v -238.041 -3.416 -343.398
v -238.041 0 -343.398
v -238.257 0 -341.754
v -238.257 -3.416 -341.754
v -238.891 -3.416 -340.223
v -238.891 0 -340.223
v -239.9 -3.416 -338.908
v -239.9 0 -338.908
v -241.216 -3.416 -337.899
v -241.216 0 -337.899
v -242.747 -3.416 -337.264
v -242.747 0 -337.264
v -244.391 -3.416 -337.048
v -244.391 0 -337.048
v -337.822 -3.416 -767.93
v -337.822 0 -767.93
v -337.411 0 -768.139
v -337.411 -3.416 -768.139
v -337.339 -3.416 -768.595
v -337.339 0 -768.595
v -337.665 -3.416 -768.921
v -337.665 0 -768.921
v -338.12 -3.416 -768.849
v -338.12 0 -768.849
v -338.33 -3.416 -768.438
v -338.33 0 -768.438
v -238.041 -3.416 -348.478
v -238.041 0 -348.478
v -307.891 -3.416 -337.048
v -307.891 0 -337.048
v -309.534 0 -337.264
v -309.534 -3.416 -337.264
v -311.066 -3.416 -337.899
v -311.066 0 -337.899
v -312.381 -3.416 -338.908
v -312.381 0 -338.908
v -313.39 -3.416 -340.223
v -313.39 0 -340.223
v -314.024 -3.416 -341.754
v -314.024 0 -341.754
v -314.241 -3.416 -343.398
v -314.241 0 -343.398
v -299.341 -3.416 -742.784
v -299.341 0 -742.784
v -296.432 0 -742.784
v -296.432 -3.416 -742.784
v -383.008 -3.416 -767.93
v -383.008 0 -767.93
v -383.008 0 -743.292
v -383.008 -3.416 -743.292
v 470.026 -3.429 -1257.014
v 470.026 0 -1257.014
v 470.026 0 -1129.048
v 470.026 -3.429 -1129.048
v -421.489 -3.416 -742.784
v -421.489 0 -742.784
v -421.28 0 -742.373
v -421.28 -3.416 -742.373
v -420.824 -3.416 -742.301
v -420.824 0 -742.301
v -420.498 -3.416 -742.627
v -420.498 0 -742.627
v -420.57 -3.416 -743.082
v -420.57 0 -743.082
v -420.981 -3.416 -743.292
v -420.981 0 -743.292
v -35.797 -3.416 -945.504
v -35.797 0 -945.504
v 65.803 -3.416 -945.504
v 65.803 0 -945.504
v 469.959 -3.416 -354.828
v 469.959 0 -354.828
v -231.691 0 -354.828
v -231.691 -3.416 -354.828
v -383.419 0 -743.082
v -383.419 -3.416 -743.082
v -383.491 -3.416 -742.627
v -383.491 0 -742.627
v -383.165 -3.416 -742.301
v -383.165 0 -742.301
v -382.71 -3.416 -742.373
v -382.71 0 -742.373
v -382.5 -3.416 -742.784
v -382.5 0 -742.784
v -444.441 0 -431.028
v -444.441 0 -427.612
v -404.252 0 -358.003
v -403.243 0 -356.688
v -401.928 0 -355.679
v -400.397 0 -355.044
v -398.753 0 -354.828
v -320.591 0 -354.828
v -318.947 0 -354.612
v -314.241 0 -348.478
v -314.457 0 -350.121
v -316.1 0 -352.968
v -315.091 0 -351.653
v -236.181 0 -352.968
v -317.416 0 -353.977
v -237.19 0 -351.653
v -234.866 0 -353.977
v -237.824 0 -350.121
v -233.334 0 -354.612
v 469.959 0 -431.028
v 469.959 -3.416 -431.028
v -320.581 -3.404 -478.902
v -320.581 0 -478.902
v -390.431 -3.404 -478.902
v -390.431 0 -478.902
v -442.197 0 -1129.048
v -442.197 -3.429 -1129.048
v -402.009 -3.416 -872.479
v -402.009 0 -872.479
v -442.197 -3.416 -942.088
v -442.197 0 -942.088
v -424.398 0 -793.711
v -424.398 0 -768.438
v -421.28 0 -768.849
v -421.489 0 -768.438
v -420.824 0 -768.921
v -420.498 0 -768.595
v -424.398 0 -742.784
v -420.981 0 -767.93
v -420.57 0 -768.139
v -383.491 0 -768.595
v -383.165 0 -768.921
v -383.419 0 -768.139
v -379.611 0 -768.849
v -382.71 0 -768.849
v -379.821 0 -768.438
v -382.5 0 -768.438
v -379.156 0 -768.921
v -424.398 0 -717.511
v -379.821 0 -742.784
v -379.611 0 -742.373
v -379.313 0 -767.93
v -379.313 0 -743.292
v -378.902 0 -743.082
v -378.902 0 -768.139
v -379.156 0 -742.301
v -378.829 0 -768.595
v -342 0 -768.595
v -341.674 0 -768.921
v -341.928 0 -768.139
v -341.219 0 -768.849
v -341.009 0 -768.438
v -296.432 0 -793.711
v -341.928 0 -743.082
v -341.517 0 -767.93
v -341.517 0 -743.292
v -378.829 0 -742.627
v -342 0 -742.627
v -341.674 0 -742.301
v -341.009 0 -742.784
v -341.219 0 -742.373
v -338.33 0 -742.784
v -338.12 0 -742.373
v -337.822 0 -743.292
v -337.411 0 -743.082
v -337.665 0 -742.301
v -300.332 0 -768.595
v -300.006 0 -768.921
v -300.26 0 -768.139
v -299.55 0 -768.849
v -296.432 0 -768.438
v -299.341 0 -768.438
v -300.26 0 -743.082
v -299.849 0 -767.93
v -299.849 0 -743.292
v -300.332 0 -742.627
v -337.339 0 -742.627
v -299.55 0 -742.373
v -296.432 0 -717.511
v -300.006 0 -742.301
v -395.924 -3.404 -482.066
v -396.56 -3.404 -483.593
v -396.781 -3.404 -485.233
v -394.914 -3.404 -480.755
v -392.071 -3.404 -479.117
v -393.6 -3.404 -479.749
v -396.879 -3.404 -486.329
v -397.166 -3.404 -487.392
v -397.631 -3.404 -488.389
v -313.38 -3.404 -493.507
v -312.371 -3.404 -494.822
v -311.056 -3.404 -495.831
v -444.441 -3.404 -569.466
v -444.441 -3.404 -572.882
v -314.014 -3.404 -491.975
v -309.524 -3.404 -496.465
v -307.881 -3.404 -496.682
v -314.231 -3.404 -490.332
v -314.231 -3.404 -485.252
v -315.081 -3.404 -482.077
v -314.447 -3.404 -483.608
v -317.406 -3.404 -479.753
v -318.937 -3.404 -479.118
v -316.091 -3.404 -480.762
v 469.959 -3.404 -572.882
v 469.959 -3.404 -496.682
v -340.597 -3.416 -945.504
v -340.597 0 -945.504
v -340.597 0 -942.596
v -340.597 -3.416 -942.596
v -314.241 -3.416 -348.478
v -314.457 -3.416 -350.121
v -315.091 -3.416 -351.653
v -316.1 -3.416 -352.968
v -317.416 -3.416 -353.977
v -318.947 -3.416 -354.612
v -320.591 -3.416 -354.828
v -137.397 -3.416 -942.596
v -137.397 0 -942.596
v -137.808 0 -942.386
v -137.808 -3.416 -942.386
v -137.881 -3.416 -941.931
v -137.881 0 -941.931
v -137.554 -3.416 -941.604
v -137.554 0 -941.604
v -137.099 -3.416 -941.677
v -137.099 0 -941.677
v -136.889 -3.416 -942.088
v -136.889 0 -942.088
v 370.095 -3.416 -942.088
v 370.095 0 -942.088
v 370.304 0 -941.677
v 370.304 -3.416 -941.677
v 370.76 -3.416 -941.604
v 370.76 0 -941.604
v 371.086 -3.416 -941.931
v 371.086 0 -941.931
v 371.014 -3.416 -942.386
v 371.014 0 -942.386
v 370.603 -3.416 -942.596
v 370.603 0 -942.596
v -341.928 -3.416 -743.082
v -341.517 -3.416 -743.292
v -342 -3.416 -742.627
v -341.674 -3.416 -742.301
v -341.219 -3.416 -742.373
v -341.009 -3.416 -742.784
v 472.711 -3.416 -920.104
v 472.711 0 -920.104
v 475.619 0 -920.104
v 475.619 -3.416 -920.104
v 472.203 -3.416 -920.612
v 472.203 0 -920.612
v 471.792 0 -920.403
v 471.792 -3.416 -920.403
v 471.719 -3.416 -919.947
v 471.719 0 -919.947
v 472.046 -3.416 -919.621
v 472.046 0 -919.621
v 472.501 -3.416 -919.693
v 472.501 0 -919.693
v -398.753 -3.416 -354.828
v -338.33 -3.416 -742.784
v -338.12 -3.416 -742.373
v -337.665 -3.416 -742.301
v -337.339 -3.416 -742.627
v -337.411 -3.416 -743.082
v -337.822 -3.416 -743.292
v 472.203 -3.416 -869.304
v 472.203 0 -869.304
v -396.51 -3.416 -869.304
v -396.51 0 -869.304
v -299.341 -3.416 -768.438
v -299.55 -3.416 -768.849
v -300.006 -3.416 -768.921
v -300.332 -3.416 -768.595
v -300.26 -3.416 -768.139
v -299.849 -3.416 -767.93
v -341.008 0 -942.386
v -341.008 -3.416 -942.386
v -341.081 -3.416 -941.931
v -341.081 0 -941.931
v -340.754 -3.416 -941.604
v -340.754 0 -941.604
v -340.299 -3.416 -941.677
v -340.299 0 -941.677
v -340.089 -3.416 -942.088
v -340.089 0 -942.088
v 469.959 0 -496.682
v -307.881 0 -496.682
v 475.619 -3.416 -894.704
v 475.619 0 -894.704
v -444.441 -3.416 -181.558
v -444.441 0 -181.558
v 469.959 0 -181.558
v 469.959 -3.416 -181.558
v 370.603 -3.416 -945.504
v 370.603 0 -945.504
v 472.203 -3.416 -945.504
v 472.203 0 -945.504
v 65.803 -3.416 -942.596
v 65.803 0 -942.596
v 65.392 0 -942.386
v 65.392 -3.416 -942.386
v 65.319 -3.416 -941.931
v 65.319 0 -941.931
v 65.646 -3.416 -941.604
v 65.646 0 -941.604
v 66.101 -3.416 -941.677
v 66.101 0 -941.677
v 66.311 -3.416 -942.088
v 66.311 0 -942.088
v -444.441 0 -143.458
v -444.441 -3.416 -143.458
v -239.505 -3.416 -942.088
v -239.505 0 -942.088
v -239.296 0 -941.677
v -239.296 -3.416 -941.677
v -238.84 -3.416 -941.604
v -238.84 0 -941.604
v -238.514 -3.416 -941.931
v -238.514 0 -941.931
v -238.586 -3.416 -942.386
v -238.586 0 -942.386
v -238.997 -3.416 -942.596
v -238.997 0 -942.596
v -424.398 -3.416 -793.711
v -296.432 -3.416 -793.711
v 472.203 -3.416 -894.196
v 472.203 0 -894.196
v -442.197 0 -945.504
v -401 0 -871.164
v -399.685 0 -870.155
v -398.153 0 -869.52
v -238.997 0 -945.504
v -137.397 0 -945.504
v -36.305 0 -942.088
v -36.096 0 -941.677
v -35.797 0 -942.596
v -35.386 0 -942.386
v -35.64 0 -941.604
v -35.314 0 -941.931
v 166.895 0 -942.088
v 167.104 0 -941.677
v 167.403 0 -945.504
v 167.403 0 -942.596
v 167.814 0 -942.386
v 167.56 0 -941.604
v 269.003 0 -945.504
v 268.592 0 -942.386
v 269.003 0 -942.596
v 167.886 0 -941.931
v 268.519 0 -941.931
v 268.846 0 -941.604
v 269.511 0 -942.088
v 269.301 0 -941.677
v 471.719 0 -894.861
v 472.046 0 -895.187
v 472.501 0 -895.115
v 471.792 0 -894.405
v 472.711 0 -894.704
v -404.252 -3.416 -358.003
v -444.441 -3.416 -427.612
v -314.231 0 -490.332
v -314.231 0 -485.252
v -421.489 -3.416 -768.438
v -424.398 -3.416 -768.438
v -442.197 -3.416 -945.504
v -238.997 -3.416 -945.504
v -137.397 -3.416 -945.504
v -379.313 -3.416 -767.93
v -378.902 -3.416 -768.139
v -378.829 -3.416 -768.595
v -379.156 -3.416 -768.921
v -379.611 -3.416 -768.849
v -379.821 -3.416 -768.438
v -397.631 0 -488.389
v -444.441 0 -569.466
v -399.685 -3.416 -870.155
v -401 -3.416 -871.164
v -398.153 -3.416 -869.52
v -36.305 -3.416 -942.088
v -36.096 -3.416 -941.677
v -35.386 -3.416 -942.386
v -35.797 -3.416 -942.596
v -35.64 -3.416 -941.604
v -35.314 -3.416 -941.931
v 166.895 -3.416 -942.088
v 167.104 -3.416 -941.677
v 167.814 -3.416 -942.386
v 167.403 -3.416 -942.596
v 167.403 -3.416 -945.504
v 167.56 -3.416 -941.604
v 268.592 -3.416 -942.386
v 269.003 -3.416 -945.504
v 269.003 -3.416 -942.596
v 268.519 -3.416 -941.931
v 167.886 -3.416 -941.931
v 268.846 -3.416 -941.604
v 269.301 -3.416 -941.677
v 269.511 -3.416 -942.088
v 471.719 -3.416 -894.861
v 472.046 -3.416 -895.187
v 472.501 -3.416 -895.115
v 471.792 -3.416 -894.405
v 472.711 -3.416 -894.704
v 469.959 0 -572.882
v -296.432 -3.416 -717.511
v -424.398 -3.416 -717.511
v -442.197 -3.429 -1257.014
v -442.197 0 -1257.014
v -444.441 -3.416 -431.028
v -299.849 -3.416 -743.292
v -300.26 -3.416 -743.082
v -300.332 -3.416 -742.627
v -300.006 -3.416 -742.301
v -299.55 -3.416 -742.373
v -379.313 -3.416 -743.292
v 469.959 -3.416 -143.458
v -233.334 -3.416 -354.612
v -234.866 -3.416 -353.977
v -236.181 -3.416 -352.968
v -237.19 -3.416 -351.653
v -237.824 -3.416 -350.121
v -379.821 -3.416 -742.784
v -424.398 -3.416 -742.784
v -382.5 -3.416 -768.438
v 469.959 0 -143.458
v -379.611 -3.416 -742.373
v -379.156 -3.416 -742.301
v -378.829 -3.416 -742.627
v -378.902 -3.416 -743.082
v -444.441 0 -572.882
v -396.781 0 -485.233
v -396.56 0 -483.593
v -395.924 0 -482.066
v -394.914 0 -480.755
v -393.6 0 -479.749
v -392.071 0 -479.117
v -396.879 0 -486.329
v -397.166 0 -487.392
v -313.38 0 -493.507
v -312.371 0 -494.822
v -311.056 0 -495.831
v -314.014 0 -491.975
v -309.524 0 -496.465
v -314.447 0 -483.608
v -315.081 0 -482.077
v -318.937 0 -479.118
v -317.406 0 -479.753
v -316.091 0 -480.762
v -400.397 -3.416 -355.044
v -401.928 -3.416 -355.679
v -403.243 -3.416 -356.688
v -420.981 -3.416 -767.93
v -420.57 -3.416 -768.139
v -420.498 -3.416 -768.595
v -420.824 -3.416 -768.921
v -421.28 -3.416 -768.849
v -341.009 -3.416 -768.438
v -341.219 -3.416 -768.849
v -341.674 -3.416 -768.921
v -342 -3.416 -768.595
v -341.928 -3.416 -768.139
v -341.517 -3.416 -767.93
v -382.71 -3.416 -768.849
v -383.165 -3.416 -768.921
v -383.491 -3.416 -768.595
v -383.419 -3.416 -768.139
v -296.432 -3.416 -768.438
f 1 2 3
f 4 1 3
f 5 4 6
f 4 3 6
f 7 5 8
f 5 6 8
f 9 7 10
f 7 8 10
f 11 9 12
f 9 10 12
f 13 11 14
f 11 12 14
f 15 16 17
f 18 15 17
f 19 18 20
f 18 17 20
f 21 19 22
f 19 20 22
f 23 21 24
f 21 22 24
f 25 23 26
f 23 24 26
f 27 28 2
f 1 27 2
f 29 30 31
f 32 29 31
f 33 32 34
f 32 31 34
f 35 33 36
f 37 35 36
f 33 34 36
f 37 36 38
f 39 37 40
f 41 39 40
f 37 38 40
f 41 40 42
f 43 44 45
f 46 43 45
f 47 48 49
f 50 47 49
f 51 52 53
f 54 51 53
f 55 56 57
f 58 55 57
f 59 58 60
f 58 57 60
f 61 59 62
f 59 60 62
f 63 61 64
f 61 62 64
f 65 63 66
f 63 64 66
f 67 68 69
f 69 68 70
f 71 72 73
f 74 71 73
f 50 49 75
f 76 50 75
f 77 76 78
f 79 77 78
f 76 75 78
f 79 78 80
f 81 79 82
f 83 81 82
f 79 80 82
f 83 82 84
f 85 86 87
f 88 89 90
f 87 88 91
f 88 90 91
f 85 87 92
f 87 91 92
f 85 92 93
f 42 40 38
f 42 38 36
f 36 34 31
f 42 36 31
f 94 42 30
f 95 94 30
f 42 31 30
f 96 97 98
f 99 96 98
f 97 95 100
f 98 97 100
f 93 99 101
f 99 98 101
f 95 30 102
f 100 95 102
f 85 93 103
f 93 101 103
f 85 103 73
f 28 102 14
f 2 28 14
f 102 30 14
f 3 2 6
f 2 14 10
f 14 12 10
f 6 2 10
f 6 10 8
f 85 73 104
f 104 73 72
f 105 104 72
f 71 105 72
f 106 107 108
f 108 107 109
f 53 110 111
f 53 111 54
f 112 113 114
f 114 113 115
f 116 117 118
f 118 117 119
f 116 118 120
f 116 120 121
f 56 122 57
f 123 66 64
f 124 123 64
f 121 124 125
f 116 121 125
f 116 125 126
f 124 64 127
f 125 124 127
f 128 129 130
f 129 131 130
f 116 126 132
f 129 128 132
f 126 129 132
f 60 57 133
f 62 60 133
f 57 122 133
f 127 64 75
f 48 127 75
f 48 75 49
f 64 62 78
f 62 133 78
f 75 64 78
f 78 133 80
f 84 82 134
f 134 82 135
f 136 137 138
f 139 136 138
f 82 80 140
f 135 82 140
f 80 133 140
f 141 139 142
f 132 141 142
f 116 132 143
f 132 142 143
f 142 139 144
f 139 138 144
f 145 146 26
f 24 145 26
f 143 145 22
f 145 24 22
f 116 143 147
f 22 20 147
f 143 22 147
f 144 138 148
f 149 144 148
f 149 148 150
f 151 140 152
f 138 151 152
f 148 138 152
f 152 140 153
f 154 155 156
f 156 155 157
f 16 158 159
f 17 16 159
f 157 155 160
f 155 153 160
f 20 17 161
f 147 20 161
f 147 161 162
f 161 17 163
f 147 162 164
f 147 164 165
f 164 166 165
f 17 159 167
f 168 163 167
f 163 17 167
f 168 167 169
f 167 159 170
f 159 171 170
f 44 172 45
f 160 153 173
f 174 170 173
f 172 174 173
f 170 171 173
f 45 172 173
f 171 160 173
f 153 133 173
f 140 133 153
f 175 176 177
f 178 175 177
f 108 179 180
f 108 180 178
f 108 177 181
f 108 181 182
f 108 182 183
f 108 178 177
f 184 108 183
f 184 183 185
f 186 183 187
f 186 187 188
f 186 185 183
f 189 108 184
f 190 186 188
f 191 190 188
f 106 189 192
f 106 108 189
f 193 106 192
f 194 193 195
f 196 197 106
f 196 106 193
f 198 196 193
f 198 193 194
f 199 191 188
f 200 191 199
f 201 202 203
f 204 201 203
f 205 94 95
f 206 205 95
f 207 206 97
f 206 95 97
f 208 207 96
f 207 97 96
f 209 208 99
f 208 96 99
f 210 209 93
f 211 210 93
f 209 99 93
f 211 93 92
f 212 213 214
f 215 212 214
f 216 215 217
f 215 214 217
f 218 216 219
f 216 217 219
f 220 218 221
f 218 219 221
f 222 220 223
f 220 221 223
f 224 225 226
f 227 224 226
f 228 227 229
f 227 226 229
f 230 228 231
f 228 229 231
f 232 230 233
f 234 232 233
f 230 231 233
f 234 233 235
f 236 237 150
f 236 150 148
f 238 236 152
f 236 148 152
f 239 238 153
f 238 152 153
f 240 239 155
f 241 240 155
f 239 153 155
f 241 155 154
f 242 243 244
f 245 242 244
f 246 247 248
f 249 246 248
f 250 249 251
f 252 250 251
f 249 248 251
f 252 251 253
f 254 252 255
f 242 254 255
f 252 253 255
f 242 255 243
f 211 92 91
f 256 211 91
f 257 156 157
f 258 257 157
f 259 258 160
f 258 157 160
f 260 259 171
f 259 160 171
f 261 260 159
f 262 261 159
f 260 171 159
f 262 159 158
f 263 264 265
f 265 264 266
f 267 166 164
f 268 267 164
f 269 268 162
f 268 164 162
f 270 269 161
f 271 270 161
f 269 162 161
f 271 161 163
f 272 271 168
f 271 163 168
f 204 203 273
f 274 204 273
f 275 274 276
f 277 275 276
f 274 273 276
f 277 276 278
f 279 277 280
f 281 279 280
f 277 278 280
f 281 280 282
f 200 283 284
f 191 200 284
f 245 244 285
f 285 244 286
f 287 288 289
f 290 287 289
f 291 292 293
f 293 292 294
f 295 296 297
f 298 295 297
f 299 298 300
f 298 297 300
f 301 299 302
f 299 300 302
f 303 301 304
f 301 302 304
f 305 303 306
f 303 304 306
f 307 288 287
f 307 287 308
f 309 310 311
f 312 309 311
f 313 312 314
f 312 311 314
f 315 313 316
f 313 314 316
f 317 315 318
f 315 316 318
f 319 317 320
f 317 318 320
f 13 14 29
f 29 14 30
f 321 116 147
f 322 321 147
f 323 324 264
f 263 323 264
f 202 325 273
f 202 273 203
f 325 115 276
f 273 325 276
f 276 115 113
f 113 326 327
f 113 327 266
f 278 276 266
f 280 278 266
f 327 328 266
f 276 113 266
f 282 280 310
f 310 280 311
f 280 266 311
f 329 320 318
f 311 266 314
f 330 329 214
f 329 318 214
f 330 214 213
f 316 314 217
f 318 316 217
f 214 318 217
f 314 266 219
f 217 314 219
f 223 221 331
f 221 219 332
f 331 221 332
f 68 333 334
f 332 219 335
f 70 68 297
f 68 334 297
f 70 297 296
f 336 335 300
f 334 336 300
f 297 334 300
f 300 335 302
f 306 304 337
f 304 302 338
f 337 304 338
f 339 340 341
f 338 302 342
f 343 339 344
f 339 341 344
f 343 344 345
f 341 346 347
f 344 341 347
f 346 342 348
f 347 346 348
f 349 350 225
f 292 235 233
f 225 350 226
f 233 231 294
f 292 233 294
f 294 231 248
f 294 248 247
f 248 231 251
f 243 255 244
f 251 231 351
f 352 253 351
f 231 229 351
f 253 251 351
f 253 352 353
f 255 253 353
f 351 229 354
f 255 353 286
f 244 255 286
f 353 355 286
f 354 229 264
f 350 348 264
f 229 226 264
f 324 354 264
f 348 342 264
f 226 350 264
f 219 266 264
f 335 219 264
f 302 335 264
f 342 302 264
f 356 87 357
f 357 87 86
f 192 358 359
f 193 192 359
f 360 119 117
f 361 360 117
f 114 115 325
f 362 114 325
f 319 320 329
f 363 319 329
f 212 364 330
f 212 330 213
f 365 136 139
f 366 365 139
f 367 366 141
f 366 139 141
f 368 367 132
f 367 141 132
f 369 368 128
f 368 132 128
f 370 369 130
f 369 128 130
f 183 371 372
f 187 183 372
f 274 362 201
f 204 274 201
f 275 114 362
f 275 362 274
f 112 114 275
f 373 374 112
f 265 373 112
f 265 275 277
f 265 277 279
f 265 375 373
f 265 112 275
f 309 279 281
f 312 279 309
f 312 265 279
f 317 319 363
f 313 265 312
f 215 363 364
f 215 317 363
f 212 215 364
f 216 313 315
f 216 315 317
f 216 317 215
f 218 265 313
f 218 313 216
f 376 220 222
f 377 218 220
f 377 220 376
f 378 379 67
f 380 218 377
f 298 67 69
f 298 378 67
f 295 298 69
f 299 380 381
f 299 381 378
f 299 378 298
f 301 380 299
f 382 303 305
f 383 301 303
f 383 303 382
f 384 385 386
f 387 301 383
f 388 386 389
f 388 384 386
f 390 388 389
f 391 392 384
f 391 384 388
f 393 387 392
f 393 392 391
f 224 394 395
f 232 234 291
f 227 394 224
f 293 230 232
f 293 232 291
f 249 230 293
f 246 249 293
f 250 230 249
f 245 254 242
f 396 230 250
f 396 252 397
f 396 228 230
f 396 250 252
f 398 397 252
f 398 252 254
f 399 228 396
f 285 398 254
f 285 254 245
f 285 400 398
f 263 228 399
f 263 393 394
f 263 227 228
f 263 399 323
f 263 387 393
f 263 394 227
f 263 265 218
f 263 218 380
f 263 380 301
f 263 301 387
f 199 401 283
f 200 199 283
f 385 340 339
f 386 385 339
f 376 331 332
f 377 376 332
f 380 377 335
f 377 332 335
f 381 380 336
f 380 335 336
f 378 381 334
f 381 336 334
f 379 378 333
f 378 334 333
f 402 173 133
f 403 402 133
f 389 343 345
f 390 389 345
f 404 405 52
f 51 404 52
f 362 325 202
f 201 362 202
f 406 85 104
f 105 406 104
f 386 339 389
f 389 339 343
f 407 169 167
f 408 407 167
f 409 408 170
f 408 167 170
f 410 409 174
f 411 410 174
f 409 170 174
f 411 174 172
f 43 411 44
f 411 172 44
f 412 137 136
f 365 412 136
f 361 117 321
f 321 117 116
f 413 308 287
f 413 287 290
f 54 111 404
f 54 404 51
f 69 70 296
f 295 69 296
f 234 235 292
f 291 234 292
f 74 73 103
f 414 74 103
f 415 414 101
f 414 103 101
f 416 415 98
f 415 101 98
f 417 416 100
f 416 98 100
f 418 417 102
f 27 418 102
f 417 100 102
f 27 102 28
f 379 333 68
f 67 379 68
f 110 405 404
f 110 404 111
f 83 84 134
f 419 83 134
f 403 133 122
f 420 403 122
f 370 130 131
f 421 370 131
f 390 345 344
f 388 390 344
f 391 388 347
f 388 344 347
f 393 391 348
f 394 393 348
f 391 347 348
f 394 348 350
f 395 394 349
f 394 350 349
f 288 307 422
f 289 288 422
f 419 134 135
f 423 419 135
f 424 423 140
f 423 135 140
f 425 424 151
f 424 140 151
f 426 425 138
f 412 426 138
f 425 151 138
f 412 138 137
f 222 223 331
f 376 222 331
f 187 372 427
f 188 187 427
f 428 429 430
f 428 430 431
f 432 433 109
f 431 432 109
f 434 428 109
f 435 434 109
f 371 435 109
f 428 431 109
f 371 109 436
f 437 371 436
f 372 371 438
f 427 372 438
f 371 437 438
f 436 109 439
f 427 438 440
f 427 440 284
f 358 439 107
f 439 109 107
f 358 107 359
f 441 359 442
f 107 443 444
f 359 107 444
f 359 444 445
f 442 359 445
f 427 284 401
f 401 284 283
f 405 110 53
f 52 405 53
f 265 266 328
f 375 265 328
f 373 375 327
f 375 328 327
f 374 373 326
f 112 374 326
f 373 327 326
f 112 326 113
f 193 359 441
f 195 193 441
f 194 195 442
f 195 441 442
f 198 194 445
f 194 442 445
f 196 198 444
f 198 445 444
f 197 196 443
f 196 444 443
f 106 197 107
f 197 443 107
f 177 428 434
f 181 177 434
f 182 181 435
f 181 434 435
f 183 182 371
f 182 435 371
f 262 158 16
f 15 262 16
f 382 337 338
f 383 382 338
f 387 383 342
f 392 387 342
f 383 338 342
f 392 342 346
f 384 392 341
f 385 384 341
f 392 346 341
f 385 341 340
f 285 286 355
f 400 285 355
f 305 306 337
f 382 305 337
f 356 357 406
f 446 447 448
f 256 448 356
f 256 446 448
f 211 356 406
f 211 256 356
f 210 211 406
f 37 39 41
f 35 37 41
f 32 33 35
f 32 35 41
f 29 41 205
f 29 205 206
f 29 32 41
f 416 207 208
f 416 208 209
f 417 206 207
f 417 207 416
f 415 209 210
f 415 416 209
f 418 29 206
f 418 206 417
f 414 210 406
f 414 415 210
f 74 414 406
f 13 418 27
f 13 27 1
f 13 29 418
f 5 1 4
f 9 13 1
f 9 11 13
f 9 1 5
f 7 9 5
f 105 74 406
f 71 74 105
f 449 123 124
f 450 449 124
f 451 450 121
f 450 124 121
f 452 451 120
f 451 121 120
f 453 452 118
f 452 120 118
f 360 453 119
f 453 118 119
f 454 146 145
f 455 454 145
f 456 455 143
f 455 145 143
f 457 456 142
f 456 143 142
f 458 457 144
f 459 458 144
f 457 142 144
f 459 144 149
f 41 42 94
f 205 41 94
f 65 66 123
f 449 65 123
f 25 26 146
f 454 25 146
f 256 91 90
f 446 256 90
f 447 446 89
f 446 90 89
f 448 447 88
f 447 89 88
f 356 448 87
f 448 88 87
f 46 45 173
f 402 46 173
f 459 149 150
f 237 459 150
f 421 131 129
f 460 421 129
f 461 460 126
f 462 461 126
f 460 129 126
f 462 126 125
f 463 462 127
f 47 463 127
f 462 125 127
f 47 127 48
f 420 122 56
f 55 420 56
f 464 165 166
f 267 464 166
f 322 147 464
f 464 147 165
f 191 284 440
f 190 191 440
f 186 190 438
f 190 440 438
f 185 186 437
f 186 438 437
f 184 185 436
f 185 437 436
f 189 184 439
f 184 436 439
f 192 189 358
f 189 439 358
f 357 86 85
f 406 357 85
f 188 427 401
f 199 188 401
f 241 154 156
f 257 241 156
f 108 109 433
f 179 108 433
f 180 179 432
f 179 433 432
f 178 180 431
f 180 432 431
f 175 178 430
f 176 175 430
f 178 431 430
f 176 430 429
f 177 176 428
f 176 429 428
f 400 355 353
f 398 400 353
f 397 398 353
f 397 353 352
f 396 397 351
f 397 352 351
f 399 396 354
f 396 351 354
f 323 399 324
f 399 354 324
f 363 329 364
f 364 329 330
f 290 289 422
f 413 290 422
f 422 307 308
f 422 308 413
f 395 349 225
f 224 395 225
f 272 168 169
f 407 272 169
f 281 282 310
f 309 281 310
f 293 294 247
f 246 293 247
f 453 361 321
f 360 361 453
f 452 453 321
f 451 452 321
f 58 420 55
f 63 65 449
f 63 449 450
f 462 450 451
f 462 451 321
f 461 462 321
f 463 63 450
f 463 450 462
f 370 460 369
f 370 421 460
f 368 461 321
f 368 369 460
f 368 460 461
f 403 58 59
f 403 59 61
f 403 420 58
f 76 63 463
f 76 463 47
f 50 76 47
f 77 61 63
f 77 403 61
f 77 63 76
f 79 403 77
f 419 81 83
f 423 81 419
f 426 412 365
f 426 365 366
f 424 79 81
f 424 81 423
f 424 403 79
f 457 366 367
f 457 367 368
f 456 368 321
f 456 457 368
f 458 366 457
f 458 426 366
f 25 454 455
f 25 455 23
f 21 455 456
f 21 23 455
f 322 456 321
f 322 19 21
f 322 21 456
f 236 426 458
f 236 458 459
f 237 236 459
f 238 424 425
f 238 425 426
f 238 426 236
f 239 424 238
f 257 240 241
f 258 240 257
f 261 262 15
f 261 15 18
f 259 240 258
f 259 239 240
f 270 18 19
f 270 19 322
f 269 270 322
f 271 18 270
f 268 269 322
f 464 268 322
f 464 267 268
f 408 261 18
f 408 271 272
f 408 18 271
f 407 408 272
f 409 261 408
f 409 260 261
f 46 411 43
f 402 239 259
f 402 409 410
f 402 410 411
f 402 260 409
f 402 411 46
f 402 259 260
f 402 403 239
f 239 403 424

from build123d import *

# Parameters (mm, degrees)
F1_W      = 914.4
F1_H      = 38.1
F2_DEPTH  = 3.4163
F4_DEPTH  = 3.4163
F6_DEPTH  = 3.4036
F8_DEPTH  = 3.4163
F10_DEPTH = 3.4163
F11_W     = 912.2229164778
F11_H     = 127.9652
F12_DEPTH = 3.429


# Not quite as in the source:
# - ends of sketch curves that miss each other by under 0.0002 mm in the source are joined


with BuildPart() as f2:
    # F1 (on Front) → F2 (new body)
    with BuildSketch(Plane.XZ):
        with Locations((12.759034133, -162.508072567)):
            Rectangle(F1_W, F1_H)
    extrude(amount=F2_DEPTH)


with BuildPart() as f4:
    # F3 (on Front) → F4 (new body)
    with BuildSketch(Plane.XZ):
        with BuildLine():
            Line((-320.590565867, -354.8278894318), (-398.7531028701, -354.8278894318))
            ThreePointArc((-398.7531028701, -354.8278894318), (-401.9281028701, -355.6786281177), (-404.2523641841, -358.0028894318))
            Line((-404.2523641841, -358.0028894318), (-444.440965867, -427.6115894318))
            Line((-444.440965867, -427.6115894318), (-444.440965867, -431.0278894318))
            Line((-444.440965867, -431.0278894318), (469.959034133, -431.0278894318))
            Line((469.959034133, -431.0278894318), (469.959034133, -354.8278894318))
            Line((469.959034133, -354.8278894318), (-231.690565867, -354.8278894318))
            ThreePointArc((-231.690565867, -354.8278894318), (-236.1806939276, -352.9680174923), (-238.040565867, -348.4778894318))
            Line((-238.040565867, -348.4778894318), (-238.040565867, -343.3978894318))
            ThreePointArc((-238.040565867, -343.3978894318), (-239.9004378065, -338.9077613712), (-244.390565867, -337.0478894318))
            Line((-244.390565867, -337.0478894318), (-307.890565867, -337.0478894318))
            ThreePointArc((-307.890565867, -337.0478894318), (-312.3806939276, -338.9077613712), (-314.240565867, -343.3978894318))
            Line((-314.240565867, -343.3978894318), (-314.240565867, -348.4778894318))
            ThreePointArc((-314.240565867, -348.4778894318), (-316.1004378065, -352.9680174923), (-320.590565867, -354.8278894318))
        make_face()
    extrude(amount=F4_DEPTH)


with BuildPart() as f6:
    # F5 (on Front) → F6 (new body)
    with BuildSketch(Plane.XZ):
        with BuildLine():
            Line((469.959034133, -572.8818325169), (469.959034133, -496.6818325169))
            Line((469.959034133, -496.6818325169), (-307.8807011454, -496.6818325169))
            ThreePointArc((-307.8807011454, -496.6818325169), (-312.370829206, -494.8219605774), (-314.2307011454, -490.3318325169))
            Line((-314.2307011454, -490.3318325169), (-314.2307011454, -485.2518325169))
            ThreePointArc((-314.2307011454, -485.2518325169), (-316.0905730849, -480.7617044564), (-320.5807011454, -478.9018325169))
            Line((-320.5807011454, -478.9018325169), (-390.4307011454, -478.9018325169))
            ThreePointArc((-390.4307011454, -478.9018325169), (-394.9141460418, -480.7550312247), (-396.780673052, -485.2329437416))
            ThreePointArc((-396.780673052, -485.2329437416), (-396.9995232777, -486.8666766847), (-397.6314398314, -488.389055145))
            Line((-397.6314398314, -488.389055145), (-444.440965867, -569.4655325169))
            Line((-444.440965867, -569.4655325169), (-444.440965867, -572.8818325169))
            Line((-444.440965867, -572.8818325169), (469.959034133, -572.8818325169))
        make_face()
    extrude(amount=F6_DEPTH)


with BuildPart() as f8:
    # F7 (on Front) → F8 (new body)
    with BuildSketch(Plane.XZ):
        with BuildLine():
            Line((-296.4323394764, -717.5106746197), (-424.3975394764, -717.5106746197))
            Line((-424.3975394764, -717.5106746197), (-424.3975394764, -742.7836746197))
            Line((-424.3975394764, -742.7836746197), (-421.4892394764, -742.7836746197))
            ThreePointArc((-421.4892394764, -742.7836746197), (-420.6220292316, -742.4244643748), (-420.9812394764, -743.2916746197))
            Line((-420.9812394764, -743.2916746197), (-420.9812394764, -755.6106746197))
            Line((-420.9812394764, -755.6106746197), (-420.9812394764, -767.9296746197))
            ThreePointArc((-420.9812394764, -767.9296746197), (-420.6220292316, -768.7968848645), (-421.4892394764, -768.4376746197))
            Line((-421.4892394764, -768.4376746197), (-424.3975394764, -768.4376746197))
            Line((-424.3975394764, -768.4376746197), (-424.3975394764, -793.7106746197))
            Line((-424.3975394764, -793.7106746197), (-296.4323394764, -793.7106746197))
            Line((-296.4323394764, -793.7106746197), (-296.4323394764, -768.4376746197))
            Line((-296.4323394764, -768.4376746197), (-299.3406394764, -768.4376746197))
            ThreePointArc((-299.3406394764, -768.4376746197), (-300.2078497213, -768.7968848645), (-299.8486394764, -767.9296746197))
            Line((-299.8486394764, -767.9296746197), (-299.8486394764, -755.6106746197))
            Line((-299.8486394764, -755.6106746197), (-299.8486394764, -743.2916746197))
            ThreePointArc((-299.8486394764, -743.2916746197), (-300.2078497213, -742.4244643748), (-299.3406394764, -742.7836746197))
            Line((-299.3406394764, -742.7836746197), (-296.4323394764, -742.7836746197))
            Line((-296.4323394764, -742.7836746197), (-296.4323394764, -717.5106746197))
        make_face()
        with BuildLine():
            Line((-383.0082394764, -755.6106746197), (-383.0082394764, -743.2916746197))
            ThreePointArc((-383.0082394764, -743.2916746197), (-383.3674497213, -742.4244643748), (-382.5002394764, -742.7836746197))
            Line((-382.5002394764, -742.7836746197), (-379.8205394764, -742.7836746197))
            ThreePointArc((-379.8205394764, -742.7836746197), (-378.9533292316, -742.4244643748), (-379.3125394764, -743.2916746197))
            Line((-379.3125394764, -743.2916746197), (-379.3125394764, -755.6106746197))
            Line((-379.3125394764, -755.6106746197), (-379.3125394764, -767.9296746197))
            ThreePointArc((-379.3125394764, -767.9296746197), (-378.9533292316, -768.7968848645), (-379.8205394764, -768.4376746197))
            Line((-379.8205394764, -768.4376746197), (-382.5002394764, -768.4376746197))
            ThreePointArc((-382.5002394764, -768.4376746197), (-383.3674497213, -768.7968848645), (-383.0082394764, -767.9296746197))
            Line((-383.0082394764, -767.9296746197), (-383.0082394764, -755.6106746197))
        make_face(mode=Mode.SUBTRACT)
        with BuildLine():
            Line((-341.5173394764, -755.6106746197), (-341.5173394764, -743.2916746197))
            ThreePointArc((-341.5173394764, -743.2916746197), (-341.8765497213, -742.4244643748), (-341.0093394764, -742.7836746197))
            Line((-341.0093394764, -742.7836746197), (-338.3296394764, -742.7836746197))
            ThreePointArc((-338.3296394764, -742.7836746197), (-337.4624292316, -742.4244643748), (-337.8216394764, -743.2916746197))
            Line((-337.8216394764, -743.2916746197), (-337.8216394764, -755.6106746197))
            Line((-337.8216394764, -755.6106746197), (-337.8216394764, -767.9296746197))
            ThreePointArc((-337.8216394764, -767.9296746197), (-337.4624292316, -768.7968848645), (-338.3296394764, -768.4376746197))
            Line((-338.3296394764, -768.4376746197), (-341.0093394764, -768.4376746197))
            ThreePointArc((-341.0093394764, -768.4376746197), (-341.8765497213, -768.7968848645), (-341.5173394764, -767.9296746197))
            Line((-341.5173394764, -767.9296746197), (-341.5173394764, -755.6106746197))
        make_face(mode=Mode.SUBTRACT)
    extrude(amount=F8_DEPTH)


with BuildPart() as f10:
    # F9 (on Front) → F10 (new body)
    with BuildSketch(Plane.XZ):
        with BuildLine():
            Line((-442.1973738139, -942.08762847), (-442.1973738139, -945.50392847))
            Line((-442.1973738139, -945.50392847), (-340.5973738139, -945.50392847))
            Line((-340.5973738139, -945.50392847), (-340.5973738139, -942.59562847))
            ThreePointArc((-340.5973738139, -942.59562847), (-340.9565840588, -941.7284182251), (-340.0893738139, -942.08762847))
            Line((-340.0893738139, -942.08762847), (-239.5053738139, -942.08762847))
            ThreePointArc((-239.5053738139, -942.08762847), (-238.6381635691, -941.7284182251), (-238.9973738139, -942.59562847))
            Line((-238.9973738139, -942.59562847), (-238.9973738139, -945.50392847))
            Line((-238.9973738139, -945.50392847), (-137.3973738139, -945.50392847))
            Line((-137.3973738139, -945.50392847), (-137.3973738139, -942.59562847))
            ThreePointArc((-137.3973738139, -942.59562847), (-137.7565840588, -941.7284182251), (-136.8893738139, -942.08762847))
            Line((-136.8893738139, -942.08762847), (-36.3053738139, -942.08762847))
            ThreePointArc((-36.3053738139, -942.08762847), (-35.4381635691, -941.7284182251), (-35.7973738139, -942.59562847))
            Line((-35.7973738139, -942.59562847), (-35.7973738139, -945.50392847))
            Line((-35.7973738139, -945.50392847), (65.8026261861, -945.50392847))
            Line((65.8026261861, -945.50392847), (65.8026261861, -942.59562847))
            ThreePointArc((65.8026261861, -942.59562847), (65.4434159412, -941.7284182251), (66.3106261861, -942.08762847))
            Line((66.3106261861, -942.08762847), (166.8946261861, -942.08762847))
            ThreePointArc((166.8946261861, -942.08762847), (167.7618364309, -941.7284182251), (167.4026261861, -942.59562847))
            Line((167.4026261861, -942.59562847), (167.4026261861, -945.50392847))
            Line((167.4026261861, -945.50392847), (269.0026261861, -945.50392847))
            Line((269.0026261861, -945.50392847), (269.0026261861, -942.59562847))
            ThreePointArc((269.0026261861, -942.59562847), (268.6434159412, -941.7284182251), (269.5106261861, -942.08762847))
            Line((269.5106261861, -942.08762847), (370.0946261861, -942.08762847))
            ThreePointArc((370.0946261861, -942.08762847), (370.9618364309, -941.7284182251), (370.6026261861, -942.59562847))
            Line((370.6026261861, -942.59562847), (370.6026261861, -945.50392847))
            Line((370.6026261861, -945.50392847), (472.2026261861, -945.50392847))
            Line((472.2026261861, -945.50392847), (472.2026261861, -920.61192847))
            ThreePointArc((472.2026261861, -920.61192847), (471.8434159412, -919.7447182251), (472.7106261861, -920.10392847))
            Line((472.7106261861, -920.10392847), (475.6189261861, -920.10392847))
            Line((475.6189261861, -920.10392847), (475.6189261861, -907.40392847))
            Line((475.6189261861, -907.40392847), (475.6189261861, -894.70392847))
            Line((475.6189261861, -894.70392847), (472.7106261861, -894.70392847))
            ThreePointArc((472.7106261861, -894.70392847), (471.8434159412, -895.0631387148), (472.2026261861, -894.19592847))
            Line((472.2026261861, -894.19592847), (472.2026261861, -869.30392847))
            Line((472.2026261861, -869.30392847), (-396.5095108169, -869.30392847))
            ThreePointArc((-396.5095108169, -869.30392847), (-399.6845108169, -870.1546671559), (-402.008772131, -872.47892847))
            Line((-402.008772131, -872.47892847), (-442.1973738139, -942.08762847))
        make_face()
    extrude(amount=F10_DEPTH)


with BuildPart() as f12:
    # F11 (on Front) → F12 (new body)
    with BuildSketch(Plane.XZ):
        with Locations((13.914084425, -1193.0309593414)):
            Rectangle(F11_W, F11_H)
    extrude(amount=F12_DEPTH)


solid = Compound([f2.part, f4.part, f6.part, f8.part, f10.part, f12.part])
